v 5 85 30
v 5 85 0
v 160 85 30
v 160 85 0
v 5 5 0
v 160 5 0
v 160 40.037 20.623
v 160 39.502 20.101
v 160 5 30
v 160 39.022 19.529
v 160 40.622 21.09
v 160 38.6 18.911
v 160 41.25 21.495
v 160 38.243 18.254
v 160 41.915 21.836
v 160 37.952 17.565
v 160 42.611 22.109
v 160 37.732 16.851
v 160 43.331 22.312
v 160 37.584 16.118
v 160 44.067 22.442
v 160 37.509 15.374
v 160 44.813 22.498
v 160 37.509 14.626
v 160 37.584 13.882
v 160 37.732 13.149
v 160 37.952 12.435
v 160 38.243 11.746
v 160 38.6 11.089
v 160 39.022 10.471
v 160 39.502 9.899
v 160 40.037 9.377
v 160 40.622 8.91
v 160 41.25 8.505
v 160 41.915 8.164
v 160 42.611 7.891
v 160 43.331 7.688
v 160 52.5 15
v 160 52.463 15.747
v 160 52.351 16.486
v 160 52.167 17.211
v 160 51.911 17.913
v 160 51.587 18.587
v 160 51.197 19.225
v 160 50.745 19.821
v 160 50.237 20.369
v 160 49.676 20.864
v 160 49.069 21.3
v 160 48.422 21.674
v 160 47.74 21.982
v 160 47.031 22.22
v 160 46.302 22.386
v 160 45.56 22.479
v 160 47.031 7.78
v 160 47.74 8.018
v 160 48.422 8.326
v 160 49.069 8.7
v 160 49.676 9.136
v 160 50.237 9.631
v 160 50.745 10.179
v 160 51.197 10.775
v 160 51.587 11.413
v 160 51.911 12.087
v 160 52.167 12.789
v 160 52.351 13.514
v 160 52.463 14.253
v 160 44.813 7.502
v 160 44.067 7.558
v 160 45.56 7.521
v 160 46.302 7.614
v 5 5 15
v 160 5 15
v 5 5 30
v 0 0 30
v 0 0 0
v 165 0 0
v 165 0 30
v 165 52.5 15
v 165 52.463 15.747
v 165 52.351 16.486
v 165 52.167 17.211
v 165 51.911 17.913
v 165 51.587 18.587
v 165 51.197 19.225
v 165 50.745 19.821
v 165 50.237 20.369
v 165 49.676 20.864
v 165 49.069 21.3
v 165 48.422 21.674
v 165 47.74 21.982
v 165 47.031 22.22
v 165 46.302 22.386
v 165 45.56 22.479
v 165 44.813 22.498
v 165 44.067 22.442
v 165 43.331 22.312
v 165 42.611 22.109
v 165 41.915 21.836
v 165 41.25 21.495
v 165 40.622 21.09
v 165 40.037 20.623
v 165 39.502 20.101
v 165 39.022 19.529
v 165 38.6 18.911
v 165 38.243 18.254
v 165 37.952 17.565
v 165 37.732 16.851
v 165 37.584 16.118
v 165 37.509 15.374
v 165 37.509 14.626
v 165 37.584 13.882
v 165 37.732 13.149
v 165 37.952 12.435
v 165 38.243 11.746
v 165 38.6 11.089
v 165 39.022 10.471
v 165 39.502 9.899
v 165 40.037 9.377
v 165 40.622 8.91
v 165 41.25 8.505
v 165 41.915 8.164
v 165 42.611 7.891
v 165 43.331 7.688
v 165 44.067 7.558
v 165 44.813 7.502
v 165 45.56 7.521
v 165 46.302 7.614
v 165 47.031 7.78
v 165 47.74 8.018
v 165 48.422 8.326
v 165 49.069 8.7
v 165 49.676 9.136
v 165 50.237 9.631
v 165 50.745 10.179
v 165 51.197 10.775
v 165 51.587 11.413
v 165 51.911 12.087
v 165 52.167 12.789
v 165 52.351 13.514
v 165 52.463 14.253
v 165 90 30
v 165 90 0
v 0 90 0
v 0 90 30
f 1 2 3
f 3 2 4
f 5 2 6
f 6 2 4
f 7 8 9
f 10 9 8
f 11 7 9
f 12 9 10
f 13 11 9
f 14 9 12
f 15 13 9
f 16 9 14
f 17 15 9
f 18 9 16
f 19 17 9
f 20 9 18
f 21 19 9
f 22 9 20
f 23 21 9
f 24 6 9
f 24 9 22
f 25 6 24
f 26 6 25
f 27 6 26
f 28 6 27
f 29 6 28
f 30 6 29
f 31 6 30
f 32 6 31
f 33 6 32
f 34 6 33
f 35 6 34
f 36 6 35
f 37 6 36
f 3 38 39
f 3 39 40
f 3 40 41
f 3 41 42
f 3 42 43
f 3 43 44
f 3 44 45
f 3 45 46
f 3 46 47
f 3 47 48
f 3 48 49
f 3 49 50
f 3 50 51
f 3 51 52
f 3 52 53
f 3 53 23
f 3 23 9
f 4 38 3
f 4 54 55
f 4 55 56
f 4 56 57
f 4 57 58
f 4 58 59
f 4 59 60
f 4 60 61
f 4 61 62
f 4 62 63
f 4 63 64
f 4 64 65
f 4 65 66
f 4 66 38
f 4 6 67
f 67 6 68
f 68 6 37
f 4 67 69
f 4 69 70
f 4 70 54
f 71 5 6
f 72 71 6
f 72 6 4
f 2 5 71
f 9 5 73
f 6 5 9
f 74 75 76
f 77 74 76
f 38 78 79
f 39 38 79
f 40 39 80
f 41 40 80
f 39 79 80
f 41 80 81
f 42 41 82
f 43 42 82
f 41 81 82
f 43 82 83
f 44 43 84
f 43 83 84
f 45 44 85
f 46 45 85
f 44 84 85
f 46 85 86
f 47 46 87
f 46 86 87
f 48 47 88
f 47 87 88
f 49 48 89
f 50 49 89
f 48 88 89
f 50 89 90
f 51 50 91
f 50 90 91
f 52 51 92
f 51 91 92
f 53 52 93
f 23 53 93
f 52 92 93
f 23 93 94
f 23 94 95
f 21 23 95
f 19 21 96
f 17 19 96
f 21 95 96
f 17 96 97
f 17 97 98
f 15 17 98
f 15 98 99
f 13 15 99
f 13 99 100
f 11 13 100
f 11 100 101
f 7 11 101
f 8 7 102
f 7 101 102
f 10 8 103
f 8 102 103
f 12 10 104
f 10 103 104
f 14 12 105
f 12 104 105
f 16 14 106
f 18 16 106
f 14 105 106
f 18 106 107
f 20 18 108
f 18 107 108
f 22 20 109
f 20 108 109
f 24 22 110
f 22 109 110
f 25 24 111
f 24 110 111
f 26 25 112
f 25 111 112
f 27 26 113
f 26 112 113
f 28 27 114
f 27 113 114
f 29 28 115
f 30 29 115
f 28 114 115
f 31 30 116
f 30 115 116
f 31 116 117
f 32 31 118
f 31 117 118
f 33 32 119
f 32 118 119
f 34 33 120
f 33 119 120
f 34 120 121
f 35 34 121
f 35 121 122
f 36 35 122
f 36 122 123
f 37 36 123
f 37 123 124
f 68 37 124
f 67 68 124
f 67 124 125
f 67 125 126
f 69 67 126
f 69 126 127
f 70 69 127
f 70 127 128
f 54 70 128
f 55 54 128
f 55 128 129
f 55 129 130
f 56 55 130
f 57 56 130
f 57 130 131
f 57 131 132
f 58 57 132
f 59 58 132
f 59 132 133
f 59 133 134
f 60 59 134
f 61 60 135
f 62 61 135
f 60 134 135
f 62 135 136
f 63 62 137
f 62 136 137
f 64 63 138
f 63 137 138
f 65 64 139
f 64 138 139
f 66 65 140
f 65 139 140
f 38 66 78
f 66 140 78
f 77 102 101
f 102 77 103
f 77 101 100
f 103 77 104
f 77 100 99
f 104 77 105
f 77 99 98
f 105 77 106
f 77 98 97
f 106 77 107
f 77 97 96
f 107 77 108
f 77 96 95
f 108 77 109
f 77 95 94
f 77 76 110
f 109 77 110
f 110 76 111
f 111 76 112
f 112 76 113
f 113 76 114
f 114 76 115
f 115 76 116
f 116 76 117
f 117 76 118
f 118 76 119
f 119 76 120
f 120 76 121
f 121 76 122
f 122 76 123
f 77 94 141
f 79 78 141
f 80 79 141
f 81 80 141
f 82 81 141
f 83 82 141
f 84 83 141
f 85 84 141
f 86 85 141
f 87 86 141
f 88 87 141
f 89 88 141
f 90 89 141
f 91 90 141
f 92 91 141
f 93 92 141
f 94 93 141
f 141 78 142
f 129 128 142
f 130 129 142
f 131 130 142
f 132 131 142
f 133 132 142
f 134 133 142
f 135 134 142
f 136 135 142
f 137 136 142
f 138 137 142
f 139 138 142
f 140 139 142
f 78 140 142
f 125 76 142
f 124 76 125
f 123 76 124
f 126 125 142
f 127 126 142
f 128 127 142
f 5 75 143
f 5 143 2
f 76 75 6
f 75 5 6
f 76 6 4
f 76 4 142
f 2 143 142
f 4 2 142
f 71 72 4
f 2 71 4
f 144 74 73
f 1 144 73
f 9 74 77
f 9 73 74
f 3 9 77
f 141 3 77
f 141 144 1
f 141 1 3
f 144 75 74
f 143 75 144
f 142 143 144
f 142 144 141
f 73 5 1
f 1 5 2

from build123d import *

# Parameters (mm, degrees)
F0_W     = 155
F0_H     = 80
F1_DEPTH = 15
F3_DEPTH = 155
F0_W_2   = 165
F0_H_2   = 90
F4_DEPTH = 30
F5_R     = 7.5
F6_DEPTH = 5


with BuildPart() as f1:
    # F0 (on Top) → F1 (new body)
    with BuildSketch(Plane.XY):
        with Locations((82.5, 45)):
            Rectangle(F0_W, F0_H)
    extrude(amount=F1_DEPTH)

    # F2 (on face) → F3 (cut)
    with BuildSketch(Plane.YZ.offset(160)):
        Polygon((85, 15), (5, 15), (85, 0), align=None)
    extrude(amount=-F3_DEPTH, mode=Mode.SUBTRACT)


with BuildPart() as f4:
    # F0 (on Top) → F4 (new body)
    with BuildSketch(Plane.XY):
        with Locations((82.5, 45)):
            Rectangle(F0_W_2, F0_H_2)
        with Locations((82.5, 45)):
            Rectangle(F0_W, F0_H, mode=Mode.SUBTRACT)
    extrude(amount=F4_DEPTH)

    # F5 (on face) → F6 (cut)
    with BuildSketch(Plane.YZ.offset(165)):
        with Locations((45, 15)):
            Circle(F5_R)
    extrude(amount=-F6_DEPTH, mode=Mode.SUBTRACT)


solid = Compound([f1.part, f4.part])
